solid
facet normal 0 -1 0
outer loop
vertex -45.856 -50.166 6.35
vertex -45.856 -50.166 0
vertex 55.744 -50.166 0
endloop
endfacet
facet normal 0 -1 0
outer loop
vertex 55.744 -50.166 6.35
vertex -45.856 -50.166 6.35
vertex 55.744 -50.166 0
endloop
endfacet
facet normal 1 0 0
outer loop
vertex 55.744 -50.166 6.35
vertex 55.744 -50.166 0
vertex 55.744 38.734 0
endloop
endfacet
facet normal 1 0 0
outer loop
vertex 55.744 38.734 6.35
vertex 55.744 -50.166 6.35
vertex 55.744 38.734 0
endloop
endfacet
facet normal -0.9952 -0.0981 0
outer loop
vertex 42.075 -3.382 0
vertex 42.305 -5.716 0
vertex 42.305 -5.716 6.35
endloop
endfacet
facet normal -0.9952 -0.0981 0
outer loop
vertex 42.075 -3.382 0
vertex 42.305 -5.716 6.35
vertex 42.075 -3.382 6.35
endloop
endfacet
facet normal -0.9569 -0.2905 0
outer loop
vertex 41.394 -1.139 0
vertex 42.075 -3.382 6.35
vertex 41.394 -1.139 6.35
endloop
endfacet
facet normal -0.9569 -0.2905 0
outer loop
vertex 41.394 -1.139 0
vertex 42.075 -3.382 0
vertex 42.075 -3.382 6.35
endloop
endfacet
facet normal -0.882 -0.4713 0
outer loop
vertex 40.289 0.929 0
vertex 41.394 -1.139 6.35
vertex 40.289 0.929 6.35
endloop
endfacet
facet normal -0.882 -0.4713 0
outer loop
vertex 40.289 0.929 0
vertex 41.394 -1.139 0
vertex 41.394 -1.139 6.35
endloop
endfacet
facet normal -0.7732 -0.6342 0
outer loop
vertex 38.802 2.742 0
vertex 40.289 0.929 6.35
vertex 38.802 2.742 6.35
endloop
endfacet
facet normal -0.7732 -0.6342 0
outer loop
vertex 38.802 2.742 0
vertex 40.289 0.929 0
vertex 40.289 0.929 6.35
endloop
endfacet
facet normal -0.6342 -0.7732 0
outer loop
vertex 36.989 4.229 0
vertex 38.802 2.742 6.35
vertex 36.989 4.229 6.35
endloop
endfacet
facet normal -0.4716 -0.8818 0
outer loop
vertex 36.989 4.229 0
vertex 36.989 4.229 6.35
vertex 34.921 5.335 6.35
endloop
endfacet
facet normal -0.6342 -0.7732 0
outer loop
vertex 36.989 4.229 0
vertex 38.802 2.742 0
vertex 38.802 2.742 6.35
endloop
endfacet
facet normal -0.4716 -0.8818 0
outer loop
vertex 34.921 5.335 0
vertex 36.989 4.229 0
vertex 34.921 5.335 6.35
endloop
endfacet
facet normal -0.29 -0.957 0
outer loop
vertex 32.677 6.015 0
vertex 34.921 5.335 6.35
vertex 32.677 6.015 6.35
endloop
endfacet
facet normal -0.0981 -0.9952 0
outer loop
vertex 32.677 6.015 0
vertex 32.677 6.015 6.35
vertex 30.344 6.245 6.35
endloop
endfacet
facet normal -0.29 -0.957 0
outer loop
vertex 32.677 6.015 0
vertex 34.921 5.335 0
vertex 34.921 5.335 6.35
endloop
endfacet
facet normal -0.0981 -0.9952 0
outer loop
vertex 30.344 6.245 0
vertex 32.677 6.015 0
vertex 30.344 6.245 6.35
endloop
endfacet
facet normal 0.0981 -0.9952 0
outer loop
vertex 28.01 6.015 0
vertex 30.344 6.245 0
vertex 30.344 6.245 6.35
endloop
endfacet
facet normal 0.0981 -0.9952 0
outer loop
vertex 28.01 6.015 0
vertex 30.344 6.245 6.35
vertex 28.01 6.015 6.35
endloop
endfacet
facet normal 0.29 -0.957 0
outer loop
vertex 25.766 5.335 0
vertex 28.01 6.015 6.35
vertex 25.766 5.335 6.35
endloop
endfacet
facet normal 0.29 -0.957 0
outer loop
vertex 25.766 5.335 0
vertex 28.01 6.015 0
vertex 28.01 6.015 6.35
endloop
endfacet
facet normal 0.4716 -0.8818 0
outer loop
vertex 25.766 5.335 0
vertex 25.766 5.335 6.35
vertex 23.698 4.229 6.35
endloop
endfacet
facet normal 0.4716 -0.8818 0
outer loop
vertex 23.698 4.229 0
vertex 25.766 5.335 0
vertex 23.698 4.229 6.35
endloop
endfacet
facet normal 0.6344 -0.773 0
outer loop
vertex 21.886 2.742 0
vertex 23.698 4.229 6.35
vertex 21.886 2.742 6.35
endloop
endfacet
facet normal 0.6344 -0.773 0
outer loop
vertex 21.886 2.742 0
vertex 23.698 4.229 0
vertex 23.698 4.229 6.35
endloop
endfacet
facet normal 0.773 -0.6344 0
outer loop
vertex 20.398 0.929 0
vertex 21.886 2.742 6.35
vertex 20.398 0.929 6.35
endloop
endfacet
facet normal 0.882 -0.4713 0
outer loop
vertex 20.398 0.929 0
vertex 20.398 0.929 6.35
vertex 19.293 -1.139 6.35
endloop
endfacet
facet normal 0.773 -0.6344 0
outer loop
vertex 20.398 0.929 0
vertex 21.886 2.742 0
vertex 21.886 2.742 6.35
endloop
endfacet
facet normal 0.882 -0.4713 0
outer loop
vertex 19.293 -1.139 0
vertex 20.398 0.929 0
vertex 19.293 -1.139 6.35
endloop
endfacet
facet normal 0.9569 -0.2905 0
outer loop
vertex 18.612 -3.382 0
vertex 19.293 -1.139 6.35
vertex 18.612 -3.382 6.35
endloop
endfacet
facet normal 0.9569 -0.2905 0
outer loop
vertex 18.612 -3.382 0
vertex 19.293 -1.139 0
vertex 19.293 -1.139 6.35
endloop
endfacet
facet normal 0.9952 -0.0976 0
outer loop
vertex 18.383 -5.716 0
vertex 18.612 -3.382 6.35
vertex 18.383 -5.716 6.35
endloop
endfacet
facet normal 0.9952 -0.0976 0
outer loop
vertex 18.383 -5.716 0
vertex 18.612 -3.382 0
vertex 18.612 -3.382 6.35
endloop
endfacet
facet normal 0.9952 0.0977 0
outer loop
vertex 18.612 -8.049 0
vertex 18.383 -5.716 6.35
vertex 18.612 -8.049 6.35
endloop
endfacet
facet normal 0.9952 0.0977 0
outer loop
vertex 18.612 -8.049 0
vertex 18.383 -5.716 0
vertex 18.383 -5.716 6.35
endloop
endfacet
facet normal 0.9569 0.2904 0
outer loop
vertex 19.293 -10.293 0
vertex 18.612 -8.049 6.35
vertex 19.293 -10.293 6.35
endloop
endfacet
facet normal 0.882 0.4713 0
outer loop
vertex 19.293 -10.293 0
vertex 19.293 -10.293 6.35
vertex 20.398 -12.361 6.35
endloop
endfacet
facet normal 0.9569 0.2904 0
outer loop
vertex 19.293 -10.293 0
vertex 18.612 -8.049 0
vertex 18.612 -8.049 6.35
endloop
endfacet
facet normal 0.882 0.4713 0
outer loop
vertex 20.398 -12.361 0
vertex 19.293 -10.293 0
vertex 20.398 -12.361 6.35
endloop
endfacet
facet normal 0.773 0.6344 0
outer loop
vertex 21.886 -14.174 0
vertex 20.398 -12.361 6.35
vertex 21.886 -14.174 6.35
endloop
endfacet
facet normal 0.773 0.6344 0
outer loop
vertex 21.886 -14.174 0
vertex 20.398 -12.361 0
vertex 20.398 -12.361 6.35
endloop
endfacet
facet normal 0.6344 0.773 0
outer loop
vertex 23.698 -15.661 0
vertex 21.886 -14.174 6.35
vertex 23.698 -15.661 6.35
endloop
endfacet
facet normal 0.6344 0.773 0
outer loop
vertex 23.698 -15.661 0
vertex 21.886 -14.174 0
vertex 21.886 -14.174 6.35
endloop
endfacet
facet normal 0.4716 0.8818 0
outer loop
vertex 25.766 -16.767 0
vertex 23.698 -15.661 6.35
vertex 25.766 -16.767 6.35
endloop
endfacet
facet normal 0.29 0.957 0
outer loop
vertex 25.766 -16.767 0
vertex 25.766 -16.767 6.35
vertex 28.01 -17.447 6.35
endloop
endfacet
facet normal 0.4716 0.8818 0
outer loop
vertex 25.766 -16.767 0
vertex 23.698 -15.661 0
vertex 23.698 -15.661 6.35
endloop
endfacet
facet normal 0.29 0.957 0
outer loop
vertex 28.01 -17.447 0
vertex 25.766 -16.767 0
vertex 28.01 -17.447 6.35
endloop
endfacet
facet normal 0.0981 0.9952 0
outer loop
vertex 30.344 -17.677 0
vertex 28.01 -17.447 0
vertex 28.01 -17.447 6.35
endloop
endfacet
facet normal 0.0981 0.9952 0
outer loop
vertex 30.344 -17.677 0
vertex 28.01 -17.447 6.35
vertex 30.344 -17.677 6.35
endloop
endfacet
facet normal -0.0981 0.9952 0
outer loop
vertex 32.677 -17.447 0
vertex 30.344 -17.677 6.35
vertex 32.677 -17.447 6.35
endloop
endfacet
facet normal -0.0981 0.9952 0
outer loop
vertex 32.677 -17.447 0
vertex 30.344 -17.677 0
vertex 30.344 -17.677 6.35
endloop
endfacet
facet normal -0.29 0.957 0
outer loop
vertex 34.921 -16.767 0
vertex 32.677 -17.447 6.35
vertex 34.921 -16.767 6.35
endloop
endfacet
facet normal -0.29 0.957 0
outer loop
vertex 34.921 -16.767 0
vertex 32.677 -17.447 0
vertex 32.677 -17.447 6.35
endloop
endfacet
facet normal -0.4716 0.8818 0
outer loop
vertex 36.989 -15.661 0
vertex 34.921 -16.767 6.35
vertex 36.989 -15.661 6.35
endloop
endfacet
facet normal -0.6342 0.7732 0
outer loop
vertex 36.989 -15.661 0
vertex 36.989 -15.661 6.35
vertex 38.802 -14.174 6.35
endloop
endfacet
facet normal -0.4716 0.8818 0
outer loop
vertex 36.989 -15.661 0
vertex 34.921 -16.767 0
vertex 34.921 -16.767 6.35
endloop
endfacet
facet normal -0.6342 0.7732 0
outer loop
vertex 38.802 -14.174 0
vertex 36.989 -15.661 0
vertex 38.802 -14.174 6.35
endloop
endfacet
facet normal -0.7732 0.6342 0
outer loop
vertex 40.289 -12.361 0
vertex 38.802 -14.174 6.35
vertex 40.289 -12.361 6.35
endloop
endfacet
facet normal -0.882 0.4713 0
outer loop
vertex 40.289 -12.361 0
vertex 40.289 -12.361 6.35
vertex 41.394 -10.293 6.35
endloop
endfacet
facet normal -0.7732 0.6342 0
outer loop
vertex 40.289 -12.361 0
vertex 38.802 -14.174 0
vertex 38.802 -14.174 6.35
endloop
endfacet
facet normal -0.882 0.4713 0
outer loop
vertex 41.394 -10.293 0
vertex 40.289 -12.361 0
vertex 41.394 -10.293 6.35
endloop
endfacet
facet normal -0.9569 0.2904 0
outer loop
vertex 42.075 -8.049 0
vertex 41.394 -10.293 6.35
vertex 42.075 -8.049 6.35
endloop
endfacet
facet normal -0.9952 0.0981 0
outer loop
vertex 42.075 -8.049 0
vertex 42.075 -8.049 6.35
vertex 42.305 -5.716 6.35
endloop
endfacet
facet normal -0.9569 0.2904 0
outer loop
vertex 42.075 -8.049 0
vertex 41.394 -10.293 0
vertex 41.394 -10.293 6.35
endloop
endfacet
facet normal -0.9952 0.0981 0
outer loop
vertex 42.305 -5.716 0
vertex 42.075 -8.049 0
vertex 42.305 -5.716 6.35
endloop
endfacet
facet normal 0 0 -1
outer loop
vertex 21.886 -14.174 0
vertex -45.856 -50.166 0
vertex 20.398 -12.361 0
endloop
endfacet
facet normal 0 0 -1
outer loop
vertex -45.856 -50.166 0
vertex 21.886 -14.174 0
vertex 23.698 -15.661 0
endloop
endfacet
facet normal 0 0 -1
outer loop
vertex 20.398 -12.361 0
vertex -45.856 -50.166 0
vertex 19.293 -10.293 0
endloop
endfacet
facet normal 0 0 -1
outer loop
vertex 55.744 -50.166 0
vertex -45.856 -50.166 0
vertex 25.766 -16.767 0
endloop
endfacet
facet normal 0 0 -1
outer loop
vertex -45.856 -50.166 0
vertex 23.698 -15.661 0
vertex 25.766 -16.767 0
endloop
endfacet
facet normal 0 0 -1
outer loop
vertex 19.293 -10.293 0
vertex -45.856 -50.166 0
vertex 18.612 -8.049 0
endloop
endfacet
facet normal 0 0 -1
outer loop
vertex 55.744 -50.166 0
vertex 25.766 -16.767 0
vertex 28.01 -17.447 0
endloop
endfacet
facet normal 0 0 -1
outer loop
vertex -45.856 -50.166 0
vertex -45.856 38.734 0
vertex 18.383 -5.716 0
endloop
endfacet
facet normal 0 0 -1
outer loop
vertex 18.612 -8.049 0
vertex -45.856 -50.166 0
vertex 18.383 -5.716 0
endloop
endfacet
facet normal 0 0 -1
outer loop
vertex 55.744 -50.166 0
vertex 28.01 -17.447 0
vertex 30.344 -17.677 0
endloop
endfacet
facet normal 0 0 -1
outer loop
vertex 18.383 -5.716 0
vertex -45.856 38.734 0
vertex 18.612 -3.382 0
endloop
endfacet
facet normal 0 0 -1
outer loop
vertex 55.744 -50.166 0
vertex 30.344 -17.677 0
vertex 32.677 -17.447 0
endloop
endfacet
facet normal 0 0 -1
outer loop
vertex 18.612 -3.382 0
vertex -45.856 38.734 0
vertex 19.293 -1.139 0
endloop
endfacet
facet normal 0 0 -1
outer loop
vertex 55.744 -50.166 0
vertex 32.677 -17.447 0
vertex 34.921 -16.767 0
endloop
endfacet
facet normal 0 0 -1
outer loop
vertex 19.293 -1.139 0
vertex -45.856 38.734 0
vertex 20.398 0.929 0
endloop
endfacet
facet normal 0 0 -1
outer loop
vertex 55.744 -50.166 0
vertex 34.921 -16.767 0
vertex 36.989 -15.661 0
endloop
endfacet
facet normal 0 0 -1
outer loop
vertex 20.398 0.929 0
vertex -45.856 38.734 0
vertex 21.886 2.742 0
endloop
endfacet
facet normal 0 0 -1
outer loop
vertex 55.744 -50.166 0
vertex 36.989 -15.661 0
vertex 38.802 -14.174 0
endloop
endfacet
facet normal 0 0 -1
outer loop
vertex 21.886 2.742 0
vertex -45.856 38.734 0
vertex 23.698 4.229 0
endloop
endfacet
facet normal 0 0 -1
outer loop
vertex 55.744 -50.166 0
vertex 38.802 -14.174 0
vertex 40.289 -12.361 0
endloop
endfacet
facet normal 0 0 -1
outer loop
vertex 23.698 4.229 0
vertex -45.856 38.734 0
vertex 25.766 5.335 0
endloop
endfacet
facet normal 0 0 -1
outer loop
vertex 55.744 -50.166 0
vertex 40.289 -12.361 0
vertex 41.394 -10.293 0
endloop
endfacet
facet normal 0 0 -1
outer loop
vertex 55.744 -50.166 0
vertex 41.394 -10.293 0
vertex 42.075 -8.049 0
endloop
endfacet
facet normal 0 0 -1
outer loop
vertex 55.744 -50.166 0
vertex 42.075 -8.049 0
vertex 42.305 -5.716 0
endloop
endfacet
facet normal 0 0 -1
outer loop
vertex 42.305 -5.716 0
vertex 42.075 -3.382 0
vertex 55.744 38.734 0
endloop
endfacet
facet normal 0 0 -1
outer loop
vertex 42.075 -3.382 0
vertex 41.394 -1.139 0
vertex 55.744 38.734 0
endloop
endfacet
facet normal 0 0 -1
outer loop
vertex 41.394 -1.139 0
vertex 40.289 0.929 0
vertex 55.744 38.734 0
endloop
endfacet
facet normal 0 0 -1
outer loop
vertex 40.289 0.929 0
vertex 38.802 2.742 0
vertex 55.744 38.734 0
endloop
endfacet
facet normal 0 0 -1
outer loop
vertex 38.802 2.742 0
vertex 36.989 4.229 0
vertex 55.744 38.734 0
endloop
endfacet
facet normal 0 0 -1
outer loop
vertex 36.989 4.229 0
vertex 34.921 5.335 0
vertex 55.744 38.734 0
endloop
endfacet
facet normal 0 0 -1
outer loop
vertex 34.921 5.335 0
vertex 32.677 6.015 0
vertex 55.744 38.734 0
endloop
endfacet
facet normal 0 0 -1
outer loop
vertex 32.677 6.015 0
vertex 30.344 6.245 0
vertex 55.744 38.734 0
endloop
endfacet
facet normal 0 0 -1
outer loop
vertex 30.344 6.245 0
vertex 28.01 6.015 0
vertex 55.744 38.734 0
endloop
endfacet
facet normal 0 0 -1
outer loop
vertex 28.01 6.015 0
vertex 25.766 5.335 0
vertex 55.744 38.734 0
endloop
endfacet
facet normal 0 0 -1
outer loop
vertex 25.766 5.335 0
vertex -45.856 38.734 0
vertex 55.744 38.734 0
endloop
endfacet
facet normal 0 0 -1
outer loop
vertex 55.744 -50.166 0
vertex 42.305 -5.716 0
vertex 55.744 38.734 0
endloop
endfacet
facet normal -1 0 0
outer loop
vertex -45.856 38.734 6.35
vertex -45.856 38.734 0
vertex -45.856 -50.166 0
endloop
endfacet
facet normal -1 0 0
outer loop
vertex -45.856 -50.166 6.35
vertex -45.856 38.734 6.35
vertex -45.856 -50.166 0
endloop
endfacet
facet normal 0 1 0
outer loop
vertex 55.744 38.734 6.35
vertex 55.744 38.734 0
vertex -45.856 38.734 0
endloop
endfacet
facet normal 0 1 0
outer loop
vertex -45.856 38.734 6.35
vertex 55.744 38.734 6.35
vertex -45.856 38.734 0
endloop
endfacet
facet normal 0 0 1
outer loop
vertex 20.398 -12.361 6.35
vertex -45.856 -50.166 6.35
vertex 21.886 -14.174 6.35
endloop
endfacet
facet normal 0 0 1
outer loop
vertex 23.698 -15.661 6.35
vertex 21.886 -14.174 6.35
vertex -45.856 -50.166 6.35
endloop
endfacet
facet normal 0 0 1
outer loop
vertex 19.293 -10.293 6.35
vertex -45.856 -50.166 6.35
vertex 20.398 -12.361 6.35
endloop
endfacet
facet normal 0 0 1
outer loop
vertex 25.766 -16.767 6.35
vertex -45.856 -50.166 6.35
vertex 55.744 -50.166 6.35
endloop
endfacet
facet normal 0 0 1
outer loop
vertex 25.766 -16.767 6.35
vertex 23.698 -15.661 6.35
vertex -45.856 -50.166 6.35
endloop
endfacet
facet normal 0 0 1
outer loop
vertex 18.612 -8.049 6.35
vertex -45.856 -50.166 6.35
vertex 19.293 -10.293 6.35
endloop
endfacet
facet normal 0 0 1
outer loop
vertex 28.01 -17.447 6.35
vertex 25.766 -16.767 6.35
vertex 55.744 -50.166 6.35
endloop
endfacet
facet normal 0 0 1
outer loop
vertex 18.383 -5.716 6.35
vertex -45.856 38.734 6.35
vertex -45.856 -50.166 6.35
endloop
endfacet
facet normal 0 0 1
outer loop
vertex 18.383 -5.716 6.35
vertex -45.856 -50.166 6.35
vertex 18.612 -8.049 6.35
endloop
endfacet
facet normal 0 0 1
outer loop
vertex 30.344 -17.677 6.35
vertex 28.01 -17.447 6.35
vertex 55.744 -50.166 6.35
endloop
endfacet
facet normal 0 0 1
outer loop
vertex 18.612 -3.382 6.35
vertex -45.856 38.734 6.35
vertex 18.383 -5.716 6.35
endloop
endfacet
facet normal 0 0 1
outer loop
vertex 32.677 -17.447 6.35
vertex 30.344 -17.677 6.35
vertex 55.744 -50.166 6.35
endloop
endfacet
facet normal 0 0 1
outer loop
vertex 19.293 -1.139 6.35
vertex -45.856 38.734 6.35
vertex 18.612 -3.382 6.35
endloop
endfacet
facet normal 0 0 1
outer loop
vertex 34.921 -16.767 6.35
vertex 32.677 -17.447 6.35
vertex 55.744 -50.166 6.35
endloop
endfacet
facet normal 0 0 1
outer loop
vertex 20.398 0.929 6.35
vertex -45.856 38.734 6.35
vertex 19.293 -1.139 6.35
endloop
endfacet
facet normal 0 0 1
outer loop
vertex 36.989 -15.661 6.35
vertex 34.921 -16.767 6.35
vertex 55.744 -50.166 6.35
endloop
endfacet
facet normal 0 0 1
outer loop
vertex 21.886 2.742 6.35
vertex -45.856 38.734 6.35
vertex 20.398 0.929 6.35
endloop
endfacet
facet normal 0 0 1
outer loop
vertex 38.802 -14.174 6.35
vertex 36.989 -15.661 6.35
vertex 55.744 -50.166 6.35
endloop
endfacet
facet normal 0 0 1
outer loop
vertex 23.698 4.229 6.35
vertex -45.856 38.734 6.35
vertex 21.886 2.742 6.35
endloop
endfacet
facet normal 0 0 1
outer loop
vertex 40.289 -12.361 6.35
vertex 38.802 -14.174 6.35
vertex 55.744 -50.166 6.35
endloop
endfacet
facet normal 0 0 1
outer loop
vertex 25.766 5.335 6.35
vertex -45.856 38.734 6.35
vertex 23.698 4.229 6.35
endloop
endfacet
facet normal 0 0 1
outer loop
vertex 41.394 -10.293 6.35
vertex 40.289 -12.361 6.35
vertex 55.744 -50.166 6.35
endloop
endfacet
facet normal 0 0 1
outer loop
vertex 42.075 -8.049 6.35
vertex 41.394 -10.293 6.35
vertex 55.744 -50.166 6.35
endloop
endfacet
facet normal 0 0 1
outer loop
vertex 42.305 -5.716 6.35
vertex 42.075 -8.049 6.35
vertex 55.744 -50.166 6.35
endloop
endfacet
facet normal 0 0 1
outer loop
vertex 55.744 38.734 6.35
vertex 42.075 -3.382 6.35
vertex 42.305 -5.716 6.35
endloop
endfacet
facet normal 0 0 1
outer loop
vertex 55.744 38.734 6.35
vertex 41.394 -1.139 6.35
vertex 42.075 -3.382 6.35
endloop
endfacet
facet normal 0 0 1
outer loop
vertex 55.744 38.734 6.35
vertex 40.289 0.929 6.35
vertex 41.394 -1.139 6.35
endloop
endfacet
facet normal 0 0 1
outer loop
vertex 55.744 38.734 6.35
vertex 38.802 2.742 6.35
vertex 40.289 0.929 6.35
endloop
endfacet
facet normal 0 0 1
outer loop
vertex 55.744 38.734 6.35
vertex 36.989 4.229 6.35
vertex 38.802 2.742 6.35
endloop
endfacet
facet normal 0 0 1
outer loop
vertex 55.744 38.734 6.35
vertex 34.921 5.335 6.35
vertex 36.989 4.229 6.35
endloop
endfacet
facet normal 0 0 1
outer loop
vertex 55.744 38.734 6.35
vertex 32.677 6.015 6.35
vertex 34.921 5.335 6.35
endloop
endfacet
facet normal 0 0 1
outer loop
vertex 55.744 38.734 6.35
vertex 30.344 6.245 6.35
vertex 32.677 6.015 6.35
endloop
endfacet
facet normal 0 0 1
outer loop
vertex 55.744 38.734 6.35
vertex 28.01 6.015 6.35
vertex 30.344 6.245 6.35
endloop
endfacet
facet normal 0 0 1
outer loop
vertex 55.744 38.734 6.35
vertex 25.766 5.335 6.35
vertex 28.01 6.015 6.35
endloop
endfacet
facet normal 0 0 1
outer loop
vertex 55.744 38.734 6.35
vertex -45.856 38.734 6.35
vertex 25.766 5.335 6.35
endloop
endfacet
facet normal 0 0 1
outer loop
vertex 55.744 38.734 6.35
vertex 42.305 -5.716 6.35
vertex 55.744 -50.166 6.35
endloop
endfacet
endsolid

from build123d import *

# Parameters (mm, degrees)
F0_R     = 11.9611676369
F1_DEPTH = 6.35


# Not quite as in the source:
# - a feature names something its author has since deleted; it is built from what else it names


with BuildPart() as f1:
    # F0 (on Top) → F1 (new body)
    with BuildSketch(Plane.XY):
        Polygon((4.9436837435, 38.7340840895), (-45.8563162565, 38.7340840895), (-45.8563162565, -50.1659159105), (55.7436837435, -50.1659159105), (55.7436837435, 38.7340840895), align=None)
        with Locations((30.3436837435, -5.7159159105)):
            Circle(F0_R, mode=Mode.SUBTRACT)
    extrude(amount=F1_DEPTH)


solid = f1.part
